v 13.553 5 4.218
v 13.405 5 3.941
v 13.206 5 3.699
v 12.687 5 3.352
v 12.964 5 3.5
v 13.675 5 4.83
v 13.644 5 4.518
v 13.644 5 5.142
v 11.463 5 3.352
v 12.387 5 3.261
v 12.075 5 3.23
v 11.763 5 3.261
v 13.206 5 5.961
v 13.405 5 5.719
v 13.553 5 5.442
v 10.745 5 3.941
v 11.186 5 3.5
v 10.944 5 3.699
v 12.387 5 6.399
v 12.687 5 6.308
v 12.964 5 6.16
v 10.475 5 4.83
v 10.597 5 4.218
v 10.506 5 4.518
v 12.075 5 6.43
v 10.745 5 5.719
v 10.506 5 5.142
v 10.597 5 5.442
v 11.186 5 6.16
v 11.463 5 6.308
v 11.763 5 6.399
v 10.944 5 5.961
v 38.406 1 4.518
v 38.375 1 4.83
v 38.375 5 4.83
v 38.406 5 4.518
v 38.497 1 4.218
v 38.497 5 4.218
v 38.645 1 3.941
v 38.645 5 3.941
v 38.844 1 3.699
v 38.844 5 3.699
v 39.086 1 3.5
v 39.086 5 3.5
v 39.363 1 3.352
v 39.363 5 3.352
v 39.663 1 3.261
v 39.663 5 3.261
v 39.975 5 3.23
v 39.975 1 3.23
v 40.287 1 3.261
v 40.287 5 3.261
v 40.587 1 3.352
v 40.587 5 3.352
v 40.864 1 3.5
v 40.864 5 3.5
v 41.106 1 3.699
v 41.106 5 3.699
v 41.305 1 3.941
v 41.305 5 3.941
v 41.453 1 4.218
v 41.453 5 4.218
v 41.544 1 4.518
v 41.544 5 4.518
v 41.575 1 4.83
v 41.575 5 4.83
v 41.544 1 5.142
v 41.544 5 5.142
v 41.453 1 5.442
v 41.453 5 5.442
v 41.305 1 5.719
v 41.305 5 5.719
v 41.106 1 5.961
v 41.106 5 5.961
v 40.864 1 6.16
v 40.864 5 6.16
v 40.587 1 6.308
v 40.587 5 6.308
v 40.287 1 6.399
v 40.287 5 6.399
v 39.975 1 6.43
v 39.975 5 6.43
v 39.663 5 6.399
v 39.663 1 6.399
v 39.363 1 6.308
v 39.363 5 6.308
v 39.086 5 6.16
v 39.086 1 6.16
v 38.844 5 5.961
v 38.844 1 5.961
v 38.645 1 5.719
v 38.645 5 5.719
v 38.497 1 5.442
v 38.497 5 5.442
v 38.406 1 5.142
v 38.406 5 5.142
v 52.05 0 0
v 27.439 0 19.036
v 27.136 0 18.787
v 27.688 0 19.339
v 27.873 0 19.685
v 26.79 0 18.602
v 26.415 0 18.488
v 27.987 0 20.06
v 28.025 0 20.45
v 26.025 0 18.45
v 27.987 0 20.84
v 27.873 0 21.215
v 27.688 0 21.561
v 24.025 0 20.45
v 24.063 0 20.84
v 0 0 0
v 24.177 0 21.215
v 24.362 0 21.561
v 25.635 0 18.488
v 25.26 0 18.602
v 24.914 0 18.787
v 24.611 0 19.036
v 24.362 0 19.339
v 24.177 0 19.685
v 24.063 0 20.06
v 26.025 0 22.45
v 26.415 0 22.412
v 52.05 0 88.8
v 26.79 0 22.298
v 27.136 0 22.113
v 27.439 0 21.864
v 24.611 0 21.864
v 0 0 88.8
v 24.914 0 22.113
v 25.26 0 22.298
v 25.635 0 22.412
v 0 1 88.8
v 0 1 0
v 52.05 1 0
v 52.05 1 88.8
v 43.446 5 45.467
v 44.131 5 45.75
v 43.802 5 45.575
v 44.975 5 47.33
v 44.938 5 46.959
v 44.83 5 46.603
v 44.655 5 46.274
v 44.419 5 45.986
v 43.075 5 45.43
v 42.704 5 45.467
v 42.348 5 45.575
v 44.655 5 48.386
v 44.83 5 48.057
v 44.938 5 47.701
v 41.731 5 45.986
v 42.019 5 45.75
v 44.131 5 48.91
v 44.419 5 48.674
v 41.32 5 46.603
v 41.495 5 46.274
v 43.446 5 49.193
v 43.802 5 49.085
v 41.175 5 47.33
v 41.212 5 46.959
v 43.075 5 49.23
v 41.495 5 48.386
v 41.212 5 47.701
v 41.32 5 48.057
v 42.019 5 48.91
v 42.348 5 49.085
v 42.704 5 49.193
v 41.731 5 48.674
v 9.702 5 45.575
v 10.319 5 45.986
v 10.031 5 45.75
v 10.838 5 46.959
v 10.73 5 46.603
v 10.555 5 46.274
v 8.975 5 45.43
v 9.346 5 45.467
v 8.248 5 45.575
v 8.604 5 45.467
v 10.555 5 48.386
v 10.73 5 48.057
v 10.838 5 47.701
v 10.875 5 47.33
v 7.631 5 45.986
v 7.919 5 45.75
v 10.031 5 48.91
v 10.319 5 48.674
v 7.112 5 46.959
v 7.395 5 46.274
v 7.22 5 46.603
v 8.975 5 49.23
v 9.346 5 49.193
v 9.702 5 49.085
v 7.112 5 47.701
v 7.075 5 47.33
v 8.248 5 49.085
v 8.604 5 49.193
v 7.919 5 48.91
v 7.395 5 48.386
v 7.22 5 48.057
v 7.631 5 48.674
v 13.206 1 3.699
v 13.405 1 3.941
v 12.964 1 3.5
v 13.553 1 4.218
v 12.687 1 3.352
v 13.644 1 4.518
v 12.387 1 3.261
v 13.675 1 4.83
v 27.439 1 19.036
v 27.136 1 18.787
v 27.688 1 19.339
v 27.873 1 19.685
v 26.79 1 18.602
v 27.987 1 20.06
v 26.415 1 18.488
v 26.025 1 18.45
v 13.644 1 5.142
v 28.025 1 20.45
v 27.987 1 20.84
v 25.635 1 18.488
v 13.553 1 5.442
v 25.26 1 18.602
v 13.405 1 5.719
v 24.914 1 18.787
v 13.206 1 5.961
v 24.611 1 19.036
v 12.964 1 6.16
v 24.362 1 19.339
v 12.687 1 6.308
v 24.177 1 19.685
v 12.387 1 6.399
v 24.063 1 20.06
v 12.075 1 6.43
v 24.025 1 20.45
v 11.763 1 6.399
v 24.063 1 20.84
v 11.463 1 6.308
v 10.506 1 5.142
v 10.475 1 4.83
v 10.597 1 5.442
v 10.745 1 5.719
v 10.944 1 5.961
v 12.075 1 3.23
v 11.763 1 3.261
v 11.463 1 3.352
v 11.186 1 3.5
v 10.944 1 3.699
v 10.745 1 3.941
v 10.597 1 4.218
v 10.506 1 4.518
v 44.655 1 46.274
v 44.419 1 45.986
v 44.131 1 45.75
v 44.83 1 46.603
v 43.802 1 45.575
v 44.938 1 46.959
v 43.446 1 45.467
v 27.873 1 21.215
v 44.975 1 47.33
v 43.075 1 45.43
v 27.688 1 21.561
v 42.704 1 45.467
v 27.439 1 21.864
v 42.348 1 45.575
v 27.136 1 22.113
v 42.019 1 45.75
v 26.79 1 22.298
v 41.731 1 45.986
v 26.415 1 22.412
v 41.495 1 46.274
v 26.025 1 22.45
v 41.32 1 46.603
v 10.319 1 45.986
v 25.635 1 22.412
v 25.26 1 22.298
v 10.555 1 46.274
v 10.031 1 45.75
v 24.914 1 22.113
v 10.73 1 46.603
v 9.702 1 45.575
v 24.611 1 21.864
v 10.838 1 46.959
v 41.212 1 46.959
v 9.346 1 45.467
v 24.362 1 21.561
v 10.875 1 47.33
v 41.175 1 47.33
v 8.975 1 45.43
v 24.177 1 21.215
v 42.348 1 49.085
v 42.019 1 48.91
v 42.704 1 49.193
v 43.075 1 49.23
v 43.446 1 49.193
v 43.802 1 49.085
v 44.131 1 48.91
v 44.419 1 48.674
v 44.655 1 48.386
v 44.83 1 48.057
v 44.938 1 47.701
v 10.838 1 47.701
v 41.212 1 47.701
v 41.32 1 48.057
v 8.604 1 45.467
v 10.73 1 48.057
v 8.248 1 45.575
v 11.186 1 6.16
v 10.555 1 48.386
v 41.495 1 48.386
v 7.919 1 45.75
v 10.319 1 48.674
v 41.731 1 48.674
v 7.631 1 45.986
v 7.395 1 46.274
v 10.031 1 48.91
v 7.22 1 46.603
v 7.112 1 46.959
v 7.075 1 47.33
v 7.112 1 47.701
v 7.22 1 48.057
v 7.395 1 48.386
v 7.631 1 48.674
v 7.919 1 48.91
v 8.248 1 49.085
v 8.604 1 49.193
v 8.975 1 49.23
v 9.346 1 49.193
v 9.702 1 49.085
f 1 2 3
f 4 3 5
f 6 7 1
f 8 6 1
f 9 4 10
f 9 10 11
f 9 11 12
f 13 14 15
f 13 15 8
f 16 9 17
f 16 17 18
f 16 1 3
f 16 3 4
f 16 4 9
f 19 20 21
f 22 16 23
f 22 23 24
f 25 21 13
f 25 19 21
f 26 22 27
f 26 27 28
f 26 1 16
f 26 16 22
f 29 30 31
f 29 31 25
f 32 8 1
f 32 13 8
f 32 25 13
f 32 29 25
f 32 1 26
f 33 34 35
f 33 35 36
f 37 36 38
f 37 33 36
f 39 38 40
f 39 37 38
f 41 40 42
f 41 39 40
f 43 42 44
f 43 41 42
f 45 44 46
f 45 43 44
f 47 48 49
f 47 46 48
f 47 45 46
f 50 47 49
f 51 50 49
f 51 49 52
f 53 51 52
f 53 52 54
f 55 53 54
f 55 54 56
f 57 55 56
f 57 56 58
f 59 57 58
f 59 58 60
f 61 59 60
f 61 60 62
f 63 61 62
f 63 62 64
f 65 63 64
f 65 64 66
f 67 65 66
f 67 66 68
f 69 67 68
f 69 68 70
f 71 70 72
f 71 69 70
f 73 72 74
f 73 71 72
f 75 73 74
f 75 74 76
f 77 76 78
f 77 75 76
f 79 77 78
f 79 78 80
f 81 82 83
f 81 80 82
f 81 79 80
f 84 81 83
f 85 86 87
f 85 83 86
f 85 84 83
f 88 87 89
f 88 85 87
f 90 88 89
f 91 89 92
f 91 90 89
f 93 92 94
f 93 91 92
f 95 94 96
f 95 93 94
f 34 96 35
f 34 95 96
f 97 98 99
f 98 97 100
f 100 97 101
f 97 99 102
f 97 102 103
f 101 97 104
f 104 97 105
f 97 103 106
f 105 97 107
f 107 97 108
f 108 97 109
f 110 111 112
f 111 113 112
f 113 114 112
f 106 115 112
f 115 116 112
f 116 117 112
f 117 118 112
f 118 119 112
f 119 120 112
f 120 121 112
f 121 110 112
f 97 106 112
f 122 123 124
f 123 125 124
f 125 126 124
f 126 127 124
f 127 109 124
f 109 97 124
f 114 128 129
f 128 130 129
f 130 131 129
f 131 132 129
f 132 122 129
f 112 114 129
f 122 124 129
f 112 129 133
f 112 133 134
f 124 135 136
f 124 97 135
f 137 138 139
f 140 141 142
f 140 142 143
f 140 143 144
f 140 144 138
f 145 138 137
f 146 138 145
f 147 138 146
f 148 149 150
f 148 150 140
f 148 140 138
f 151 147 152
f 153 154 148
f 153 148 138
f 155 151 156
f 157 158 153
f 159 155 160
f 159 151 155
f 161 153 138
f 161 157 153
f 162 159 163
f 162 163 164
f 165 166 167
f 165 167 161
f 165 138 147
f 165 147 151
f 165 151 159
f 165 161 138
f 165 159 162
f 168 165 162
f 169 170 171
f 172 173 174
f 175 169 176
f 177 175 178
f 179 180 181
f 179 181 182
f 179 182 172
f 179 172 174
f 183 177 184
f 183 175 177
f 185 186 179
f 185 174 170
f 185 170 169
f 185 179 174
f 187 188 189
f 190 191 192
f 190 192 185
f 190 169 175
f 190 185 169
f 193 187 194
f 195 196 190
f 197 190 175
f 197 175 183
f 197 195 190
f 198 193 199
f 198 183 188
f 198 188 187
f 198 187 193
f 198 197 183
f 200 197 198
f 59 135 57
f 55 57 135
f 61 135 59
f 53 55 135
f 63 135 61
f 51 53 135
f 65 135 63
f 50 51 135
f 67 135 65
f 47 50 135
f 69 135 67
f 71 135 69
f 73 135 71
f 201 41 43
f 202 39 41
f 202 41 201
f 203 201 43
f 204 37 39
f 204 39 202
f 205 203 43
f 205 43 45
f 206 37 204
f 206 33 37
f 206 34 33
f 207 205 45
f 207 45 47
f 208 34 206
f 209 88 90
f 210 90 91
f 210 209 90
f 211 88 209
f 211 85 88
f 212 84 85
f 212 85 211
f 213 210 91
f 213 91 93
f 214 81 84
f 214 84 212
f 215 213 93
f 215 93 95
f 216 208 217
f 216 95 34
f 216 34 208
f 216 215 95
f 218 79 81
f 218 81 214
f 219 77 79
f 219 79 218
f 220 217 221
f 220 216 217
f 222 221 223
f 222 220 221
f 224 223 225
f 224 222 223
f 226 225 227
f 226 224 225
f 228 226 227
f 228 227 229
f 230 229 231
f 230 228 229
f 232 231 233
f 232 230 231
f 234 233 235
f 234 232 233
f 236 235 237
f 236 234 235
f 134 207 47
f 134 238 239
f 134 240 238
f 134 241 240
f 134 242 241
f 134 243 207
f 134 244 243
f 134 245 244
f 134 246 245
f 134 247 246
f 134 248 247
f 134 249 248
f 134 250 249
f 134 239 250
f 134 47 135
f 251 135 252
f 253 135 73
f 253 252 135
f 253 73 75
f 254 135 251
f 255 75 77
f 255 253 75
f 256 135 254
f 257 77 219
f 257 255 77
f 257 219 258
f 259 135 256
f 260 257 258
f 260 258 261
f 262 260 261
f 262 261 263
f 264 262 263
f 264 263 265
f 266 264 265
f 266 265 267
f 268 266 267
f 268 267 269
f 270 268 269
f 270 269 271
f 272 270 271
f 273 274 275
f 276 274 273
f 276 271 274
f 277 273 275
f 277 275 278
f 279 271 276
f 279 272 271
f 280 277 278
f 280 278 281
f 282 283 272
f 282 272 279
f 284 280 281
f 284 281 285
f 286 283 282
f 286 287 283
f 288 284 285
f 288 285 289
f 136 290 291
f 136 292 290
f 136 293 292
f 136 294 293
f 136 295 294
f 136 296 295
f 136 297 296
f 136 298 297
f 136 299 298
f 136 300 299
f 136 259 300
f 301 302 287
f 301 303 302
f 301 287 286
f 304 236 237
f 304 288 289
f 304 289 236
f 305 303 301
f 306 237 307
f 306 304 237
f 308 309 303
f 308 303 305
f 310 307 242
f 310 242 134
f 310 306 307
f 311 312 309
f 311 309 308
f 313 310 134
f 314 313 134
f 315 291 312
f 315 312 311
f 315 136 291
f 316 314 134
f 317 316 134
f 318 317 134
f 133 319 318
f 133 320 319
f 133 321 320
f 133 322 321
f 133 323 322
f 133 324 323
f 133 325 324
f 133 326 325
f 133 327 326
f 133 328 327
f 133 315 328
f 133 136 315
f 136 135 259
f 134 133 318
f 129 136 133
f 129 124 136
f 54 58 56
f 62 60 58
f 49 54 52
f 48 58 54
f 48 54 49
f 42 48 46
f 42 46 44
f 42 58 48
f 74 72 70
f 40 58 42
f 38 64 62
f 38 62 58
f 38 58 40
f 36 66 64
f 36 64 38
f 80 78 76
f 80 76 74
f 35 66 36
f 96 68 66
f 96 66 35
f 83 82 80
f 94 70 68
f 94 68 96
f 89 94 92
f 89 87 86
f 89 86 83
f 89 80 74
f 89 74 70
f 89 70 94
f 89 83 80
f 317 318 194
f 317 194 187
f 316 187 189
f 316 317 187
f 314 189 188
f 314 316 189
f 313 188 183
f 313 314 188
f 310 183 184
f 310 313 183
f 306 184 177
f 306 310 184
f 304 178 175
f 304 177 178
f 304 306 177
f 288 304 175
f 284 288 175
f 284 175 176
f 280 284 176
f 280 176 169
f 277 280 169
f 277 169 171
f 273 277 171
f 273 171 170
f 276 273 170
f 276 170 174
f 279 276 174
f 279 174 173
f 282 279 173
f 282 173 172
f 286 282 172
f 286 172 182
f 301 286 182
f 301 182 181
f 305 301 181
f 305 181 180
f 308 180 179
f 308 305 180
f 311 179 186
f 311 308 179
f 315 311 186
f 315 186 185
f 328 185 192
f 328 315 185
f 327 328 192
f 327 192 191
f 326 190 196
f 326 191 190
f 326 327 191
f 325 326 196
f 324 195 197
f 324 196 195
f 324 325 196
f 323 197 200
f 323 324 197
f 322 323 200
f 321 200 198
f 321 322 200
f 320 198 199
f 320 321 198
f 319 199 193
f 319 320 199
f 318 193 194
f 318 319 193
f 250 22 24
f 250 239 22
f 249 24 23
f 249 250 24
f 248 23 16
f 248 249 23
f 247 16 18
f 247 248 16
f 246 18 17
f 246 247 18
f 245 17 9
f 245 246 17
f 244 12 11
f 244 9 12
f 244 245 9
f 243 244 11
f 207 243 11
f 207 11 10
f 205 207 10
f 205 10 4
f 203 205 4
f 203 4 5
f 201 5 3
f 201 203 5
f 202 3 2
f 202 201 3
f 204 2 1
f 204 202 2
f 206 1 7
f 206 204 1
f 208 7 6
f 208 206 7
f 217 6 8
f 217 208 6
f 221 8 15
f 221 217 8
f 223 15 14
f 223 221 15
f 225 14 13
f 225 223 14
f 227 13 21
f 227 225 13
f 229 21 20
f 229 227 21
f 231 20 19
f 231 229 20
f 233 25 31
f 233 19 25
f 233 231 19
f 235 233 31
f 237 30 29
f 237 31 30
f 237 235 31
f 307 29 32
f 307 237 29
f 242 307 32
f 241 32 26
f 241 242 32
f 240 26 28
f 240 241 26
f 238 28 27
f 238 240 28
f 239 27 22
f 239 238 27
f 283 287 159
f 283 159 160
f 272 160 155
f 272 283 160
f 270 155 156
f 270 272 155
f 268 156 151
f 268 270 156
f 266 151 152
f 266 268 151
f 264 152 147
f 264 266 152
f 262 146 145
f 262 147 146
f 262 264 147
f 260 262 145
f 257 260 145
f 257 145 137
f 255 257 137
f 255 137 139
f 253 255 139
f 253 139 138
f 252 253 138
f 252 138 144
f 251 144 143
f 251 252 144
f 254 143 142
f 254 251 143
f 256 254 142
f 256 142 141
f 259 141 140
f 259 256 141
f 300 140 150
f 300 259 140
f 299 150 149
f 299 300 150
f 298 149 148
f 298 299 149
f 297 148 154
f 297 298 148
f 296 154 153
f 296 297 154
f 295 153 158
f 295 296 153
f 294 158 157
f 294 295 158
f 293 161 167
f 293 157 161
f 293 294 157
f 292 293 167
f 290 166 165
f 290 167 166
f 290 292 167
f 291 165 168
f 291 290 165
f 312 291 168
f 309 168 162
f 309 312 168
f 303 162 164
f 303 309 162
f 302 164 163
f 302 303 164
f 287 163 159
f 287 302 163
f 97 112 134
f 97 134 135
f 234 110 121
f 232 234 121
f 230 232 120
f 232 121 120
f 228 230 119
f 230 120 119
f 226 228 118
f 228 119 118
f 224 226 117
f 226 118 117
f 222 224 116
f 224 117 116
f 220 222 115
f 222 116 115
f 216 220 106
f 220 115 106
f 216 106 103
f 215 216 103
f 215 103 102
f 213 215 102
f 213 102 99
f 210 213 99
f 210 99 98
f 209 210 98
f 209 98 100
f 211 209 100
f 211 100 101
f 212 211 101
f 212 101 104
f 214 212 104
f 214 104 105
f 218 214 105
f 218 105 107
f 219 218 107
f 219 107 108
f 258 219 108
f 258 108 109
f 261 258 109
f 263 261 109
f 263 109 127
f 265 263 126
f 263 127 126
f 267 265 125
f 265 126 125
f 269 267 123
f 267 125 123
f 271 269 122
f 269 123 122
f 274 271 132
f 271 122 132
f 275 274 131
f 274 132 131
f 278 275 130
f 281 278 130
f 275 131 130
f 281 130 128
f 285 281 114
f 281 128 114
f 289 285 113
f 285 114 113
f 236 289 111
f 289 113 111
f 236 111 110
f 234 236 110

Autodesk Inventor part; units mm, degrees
ref_plane "YZ Plane" through (0, 0, 0) normal (1, 0, 0) x (0, 1, 0)
ref_plane "XZ Plane" through (0, 0, 0) normal (0, 1, 0) x (-1, 0, 0)
ref_plane "XY Plane" through (0, 0, 0) normal (0, 0, 1) x (1, 0, 0)
sketch "Sketch1" plane through (0, 0, 0) normal (0, 1, 0) x (-1, 0, 0)
  point P0 (0, 0)
sketch "Sketch2" plane through (0, 0, 0) normal (0, 1, 0) x (-1, 0, 0)
  line L0 (0, 0) -> (-52.05, 0)
  line L1 (-52.05, 0) -> (-52.05, 88.8)
  line L2 (-52.05, 88.8) -> (0, 88.8)
  line L3 (0, 88.8) -> (0, 0)
  circle A0 centre (-8.975, 47.33) radius 1.9
  line L4 (-26.025, 67.1436) -> (-26.025, 88.8)
  circle A1 centre (-12.075, 4.83) radius 1.6
  circle A2 centre (-43.075, 47.33) radius 1.9
  circle A3 centre (-39.975, 4.83) radius 1.6
  circle A4 centre (-26.025, 20.45) radius 2
  dimension "d0" = 52.05
  dimension "d1" = 88.8
  dimension "d2" = 3.8
  dimension "d4" = 17.05
  dimension "d5" = 3.2
  dimension "d6" = 13.95
  dimension "d7" = 42.5
  dimension "d12" = 4.83
  dimension "d13" = 4
  dimension "d17" = 15.62
  dimension "d18" = 27.9
  dimension "d19" = 3.1
  dimension "d20" = 13.95
extrude "Extrusion1" add sketch "Sketch2" along normal blind 5 contours A0 | A1 | A2 | A3
sketch "Sketch3" plane through (43.075, 0, 47.33) normal (0, -1, 0) x (1, 0, 0)
  circle A0 centre (0, 0) radius 1.9 projected
  circle A1 centre (-34.1, 0) radius 1.9 projected
  point P0 (-43.075, -47.33)
  dimension "d21" = 34.1
extrude "Extrusion2" add sketch "Sketch2" along normal blind 1 contours L0 L1 L2 L3 | A4
extrude "Extrusion3" cut sketch "Sketch2" along normal mid plane 5 contours A4
properties part number "test fit for rfid reader"
